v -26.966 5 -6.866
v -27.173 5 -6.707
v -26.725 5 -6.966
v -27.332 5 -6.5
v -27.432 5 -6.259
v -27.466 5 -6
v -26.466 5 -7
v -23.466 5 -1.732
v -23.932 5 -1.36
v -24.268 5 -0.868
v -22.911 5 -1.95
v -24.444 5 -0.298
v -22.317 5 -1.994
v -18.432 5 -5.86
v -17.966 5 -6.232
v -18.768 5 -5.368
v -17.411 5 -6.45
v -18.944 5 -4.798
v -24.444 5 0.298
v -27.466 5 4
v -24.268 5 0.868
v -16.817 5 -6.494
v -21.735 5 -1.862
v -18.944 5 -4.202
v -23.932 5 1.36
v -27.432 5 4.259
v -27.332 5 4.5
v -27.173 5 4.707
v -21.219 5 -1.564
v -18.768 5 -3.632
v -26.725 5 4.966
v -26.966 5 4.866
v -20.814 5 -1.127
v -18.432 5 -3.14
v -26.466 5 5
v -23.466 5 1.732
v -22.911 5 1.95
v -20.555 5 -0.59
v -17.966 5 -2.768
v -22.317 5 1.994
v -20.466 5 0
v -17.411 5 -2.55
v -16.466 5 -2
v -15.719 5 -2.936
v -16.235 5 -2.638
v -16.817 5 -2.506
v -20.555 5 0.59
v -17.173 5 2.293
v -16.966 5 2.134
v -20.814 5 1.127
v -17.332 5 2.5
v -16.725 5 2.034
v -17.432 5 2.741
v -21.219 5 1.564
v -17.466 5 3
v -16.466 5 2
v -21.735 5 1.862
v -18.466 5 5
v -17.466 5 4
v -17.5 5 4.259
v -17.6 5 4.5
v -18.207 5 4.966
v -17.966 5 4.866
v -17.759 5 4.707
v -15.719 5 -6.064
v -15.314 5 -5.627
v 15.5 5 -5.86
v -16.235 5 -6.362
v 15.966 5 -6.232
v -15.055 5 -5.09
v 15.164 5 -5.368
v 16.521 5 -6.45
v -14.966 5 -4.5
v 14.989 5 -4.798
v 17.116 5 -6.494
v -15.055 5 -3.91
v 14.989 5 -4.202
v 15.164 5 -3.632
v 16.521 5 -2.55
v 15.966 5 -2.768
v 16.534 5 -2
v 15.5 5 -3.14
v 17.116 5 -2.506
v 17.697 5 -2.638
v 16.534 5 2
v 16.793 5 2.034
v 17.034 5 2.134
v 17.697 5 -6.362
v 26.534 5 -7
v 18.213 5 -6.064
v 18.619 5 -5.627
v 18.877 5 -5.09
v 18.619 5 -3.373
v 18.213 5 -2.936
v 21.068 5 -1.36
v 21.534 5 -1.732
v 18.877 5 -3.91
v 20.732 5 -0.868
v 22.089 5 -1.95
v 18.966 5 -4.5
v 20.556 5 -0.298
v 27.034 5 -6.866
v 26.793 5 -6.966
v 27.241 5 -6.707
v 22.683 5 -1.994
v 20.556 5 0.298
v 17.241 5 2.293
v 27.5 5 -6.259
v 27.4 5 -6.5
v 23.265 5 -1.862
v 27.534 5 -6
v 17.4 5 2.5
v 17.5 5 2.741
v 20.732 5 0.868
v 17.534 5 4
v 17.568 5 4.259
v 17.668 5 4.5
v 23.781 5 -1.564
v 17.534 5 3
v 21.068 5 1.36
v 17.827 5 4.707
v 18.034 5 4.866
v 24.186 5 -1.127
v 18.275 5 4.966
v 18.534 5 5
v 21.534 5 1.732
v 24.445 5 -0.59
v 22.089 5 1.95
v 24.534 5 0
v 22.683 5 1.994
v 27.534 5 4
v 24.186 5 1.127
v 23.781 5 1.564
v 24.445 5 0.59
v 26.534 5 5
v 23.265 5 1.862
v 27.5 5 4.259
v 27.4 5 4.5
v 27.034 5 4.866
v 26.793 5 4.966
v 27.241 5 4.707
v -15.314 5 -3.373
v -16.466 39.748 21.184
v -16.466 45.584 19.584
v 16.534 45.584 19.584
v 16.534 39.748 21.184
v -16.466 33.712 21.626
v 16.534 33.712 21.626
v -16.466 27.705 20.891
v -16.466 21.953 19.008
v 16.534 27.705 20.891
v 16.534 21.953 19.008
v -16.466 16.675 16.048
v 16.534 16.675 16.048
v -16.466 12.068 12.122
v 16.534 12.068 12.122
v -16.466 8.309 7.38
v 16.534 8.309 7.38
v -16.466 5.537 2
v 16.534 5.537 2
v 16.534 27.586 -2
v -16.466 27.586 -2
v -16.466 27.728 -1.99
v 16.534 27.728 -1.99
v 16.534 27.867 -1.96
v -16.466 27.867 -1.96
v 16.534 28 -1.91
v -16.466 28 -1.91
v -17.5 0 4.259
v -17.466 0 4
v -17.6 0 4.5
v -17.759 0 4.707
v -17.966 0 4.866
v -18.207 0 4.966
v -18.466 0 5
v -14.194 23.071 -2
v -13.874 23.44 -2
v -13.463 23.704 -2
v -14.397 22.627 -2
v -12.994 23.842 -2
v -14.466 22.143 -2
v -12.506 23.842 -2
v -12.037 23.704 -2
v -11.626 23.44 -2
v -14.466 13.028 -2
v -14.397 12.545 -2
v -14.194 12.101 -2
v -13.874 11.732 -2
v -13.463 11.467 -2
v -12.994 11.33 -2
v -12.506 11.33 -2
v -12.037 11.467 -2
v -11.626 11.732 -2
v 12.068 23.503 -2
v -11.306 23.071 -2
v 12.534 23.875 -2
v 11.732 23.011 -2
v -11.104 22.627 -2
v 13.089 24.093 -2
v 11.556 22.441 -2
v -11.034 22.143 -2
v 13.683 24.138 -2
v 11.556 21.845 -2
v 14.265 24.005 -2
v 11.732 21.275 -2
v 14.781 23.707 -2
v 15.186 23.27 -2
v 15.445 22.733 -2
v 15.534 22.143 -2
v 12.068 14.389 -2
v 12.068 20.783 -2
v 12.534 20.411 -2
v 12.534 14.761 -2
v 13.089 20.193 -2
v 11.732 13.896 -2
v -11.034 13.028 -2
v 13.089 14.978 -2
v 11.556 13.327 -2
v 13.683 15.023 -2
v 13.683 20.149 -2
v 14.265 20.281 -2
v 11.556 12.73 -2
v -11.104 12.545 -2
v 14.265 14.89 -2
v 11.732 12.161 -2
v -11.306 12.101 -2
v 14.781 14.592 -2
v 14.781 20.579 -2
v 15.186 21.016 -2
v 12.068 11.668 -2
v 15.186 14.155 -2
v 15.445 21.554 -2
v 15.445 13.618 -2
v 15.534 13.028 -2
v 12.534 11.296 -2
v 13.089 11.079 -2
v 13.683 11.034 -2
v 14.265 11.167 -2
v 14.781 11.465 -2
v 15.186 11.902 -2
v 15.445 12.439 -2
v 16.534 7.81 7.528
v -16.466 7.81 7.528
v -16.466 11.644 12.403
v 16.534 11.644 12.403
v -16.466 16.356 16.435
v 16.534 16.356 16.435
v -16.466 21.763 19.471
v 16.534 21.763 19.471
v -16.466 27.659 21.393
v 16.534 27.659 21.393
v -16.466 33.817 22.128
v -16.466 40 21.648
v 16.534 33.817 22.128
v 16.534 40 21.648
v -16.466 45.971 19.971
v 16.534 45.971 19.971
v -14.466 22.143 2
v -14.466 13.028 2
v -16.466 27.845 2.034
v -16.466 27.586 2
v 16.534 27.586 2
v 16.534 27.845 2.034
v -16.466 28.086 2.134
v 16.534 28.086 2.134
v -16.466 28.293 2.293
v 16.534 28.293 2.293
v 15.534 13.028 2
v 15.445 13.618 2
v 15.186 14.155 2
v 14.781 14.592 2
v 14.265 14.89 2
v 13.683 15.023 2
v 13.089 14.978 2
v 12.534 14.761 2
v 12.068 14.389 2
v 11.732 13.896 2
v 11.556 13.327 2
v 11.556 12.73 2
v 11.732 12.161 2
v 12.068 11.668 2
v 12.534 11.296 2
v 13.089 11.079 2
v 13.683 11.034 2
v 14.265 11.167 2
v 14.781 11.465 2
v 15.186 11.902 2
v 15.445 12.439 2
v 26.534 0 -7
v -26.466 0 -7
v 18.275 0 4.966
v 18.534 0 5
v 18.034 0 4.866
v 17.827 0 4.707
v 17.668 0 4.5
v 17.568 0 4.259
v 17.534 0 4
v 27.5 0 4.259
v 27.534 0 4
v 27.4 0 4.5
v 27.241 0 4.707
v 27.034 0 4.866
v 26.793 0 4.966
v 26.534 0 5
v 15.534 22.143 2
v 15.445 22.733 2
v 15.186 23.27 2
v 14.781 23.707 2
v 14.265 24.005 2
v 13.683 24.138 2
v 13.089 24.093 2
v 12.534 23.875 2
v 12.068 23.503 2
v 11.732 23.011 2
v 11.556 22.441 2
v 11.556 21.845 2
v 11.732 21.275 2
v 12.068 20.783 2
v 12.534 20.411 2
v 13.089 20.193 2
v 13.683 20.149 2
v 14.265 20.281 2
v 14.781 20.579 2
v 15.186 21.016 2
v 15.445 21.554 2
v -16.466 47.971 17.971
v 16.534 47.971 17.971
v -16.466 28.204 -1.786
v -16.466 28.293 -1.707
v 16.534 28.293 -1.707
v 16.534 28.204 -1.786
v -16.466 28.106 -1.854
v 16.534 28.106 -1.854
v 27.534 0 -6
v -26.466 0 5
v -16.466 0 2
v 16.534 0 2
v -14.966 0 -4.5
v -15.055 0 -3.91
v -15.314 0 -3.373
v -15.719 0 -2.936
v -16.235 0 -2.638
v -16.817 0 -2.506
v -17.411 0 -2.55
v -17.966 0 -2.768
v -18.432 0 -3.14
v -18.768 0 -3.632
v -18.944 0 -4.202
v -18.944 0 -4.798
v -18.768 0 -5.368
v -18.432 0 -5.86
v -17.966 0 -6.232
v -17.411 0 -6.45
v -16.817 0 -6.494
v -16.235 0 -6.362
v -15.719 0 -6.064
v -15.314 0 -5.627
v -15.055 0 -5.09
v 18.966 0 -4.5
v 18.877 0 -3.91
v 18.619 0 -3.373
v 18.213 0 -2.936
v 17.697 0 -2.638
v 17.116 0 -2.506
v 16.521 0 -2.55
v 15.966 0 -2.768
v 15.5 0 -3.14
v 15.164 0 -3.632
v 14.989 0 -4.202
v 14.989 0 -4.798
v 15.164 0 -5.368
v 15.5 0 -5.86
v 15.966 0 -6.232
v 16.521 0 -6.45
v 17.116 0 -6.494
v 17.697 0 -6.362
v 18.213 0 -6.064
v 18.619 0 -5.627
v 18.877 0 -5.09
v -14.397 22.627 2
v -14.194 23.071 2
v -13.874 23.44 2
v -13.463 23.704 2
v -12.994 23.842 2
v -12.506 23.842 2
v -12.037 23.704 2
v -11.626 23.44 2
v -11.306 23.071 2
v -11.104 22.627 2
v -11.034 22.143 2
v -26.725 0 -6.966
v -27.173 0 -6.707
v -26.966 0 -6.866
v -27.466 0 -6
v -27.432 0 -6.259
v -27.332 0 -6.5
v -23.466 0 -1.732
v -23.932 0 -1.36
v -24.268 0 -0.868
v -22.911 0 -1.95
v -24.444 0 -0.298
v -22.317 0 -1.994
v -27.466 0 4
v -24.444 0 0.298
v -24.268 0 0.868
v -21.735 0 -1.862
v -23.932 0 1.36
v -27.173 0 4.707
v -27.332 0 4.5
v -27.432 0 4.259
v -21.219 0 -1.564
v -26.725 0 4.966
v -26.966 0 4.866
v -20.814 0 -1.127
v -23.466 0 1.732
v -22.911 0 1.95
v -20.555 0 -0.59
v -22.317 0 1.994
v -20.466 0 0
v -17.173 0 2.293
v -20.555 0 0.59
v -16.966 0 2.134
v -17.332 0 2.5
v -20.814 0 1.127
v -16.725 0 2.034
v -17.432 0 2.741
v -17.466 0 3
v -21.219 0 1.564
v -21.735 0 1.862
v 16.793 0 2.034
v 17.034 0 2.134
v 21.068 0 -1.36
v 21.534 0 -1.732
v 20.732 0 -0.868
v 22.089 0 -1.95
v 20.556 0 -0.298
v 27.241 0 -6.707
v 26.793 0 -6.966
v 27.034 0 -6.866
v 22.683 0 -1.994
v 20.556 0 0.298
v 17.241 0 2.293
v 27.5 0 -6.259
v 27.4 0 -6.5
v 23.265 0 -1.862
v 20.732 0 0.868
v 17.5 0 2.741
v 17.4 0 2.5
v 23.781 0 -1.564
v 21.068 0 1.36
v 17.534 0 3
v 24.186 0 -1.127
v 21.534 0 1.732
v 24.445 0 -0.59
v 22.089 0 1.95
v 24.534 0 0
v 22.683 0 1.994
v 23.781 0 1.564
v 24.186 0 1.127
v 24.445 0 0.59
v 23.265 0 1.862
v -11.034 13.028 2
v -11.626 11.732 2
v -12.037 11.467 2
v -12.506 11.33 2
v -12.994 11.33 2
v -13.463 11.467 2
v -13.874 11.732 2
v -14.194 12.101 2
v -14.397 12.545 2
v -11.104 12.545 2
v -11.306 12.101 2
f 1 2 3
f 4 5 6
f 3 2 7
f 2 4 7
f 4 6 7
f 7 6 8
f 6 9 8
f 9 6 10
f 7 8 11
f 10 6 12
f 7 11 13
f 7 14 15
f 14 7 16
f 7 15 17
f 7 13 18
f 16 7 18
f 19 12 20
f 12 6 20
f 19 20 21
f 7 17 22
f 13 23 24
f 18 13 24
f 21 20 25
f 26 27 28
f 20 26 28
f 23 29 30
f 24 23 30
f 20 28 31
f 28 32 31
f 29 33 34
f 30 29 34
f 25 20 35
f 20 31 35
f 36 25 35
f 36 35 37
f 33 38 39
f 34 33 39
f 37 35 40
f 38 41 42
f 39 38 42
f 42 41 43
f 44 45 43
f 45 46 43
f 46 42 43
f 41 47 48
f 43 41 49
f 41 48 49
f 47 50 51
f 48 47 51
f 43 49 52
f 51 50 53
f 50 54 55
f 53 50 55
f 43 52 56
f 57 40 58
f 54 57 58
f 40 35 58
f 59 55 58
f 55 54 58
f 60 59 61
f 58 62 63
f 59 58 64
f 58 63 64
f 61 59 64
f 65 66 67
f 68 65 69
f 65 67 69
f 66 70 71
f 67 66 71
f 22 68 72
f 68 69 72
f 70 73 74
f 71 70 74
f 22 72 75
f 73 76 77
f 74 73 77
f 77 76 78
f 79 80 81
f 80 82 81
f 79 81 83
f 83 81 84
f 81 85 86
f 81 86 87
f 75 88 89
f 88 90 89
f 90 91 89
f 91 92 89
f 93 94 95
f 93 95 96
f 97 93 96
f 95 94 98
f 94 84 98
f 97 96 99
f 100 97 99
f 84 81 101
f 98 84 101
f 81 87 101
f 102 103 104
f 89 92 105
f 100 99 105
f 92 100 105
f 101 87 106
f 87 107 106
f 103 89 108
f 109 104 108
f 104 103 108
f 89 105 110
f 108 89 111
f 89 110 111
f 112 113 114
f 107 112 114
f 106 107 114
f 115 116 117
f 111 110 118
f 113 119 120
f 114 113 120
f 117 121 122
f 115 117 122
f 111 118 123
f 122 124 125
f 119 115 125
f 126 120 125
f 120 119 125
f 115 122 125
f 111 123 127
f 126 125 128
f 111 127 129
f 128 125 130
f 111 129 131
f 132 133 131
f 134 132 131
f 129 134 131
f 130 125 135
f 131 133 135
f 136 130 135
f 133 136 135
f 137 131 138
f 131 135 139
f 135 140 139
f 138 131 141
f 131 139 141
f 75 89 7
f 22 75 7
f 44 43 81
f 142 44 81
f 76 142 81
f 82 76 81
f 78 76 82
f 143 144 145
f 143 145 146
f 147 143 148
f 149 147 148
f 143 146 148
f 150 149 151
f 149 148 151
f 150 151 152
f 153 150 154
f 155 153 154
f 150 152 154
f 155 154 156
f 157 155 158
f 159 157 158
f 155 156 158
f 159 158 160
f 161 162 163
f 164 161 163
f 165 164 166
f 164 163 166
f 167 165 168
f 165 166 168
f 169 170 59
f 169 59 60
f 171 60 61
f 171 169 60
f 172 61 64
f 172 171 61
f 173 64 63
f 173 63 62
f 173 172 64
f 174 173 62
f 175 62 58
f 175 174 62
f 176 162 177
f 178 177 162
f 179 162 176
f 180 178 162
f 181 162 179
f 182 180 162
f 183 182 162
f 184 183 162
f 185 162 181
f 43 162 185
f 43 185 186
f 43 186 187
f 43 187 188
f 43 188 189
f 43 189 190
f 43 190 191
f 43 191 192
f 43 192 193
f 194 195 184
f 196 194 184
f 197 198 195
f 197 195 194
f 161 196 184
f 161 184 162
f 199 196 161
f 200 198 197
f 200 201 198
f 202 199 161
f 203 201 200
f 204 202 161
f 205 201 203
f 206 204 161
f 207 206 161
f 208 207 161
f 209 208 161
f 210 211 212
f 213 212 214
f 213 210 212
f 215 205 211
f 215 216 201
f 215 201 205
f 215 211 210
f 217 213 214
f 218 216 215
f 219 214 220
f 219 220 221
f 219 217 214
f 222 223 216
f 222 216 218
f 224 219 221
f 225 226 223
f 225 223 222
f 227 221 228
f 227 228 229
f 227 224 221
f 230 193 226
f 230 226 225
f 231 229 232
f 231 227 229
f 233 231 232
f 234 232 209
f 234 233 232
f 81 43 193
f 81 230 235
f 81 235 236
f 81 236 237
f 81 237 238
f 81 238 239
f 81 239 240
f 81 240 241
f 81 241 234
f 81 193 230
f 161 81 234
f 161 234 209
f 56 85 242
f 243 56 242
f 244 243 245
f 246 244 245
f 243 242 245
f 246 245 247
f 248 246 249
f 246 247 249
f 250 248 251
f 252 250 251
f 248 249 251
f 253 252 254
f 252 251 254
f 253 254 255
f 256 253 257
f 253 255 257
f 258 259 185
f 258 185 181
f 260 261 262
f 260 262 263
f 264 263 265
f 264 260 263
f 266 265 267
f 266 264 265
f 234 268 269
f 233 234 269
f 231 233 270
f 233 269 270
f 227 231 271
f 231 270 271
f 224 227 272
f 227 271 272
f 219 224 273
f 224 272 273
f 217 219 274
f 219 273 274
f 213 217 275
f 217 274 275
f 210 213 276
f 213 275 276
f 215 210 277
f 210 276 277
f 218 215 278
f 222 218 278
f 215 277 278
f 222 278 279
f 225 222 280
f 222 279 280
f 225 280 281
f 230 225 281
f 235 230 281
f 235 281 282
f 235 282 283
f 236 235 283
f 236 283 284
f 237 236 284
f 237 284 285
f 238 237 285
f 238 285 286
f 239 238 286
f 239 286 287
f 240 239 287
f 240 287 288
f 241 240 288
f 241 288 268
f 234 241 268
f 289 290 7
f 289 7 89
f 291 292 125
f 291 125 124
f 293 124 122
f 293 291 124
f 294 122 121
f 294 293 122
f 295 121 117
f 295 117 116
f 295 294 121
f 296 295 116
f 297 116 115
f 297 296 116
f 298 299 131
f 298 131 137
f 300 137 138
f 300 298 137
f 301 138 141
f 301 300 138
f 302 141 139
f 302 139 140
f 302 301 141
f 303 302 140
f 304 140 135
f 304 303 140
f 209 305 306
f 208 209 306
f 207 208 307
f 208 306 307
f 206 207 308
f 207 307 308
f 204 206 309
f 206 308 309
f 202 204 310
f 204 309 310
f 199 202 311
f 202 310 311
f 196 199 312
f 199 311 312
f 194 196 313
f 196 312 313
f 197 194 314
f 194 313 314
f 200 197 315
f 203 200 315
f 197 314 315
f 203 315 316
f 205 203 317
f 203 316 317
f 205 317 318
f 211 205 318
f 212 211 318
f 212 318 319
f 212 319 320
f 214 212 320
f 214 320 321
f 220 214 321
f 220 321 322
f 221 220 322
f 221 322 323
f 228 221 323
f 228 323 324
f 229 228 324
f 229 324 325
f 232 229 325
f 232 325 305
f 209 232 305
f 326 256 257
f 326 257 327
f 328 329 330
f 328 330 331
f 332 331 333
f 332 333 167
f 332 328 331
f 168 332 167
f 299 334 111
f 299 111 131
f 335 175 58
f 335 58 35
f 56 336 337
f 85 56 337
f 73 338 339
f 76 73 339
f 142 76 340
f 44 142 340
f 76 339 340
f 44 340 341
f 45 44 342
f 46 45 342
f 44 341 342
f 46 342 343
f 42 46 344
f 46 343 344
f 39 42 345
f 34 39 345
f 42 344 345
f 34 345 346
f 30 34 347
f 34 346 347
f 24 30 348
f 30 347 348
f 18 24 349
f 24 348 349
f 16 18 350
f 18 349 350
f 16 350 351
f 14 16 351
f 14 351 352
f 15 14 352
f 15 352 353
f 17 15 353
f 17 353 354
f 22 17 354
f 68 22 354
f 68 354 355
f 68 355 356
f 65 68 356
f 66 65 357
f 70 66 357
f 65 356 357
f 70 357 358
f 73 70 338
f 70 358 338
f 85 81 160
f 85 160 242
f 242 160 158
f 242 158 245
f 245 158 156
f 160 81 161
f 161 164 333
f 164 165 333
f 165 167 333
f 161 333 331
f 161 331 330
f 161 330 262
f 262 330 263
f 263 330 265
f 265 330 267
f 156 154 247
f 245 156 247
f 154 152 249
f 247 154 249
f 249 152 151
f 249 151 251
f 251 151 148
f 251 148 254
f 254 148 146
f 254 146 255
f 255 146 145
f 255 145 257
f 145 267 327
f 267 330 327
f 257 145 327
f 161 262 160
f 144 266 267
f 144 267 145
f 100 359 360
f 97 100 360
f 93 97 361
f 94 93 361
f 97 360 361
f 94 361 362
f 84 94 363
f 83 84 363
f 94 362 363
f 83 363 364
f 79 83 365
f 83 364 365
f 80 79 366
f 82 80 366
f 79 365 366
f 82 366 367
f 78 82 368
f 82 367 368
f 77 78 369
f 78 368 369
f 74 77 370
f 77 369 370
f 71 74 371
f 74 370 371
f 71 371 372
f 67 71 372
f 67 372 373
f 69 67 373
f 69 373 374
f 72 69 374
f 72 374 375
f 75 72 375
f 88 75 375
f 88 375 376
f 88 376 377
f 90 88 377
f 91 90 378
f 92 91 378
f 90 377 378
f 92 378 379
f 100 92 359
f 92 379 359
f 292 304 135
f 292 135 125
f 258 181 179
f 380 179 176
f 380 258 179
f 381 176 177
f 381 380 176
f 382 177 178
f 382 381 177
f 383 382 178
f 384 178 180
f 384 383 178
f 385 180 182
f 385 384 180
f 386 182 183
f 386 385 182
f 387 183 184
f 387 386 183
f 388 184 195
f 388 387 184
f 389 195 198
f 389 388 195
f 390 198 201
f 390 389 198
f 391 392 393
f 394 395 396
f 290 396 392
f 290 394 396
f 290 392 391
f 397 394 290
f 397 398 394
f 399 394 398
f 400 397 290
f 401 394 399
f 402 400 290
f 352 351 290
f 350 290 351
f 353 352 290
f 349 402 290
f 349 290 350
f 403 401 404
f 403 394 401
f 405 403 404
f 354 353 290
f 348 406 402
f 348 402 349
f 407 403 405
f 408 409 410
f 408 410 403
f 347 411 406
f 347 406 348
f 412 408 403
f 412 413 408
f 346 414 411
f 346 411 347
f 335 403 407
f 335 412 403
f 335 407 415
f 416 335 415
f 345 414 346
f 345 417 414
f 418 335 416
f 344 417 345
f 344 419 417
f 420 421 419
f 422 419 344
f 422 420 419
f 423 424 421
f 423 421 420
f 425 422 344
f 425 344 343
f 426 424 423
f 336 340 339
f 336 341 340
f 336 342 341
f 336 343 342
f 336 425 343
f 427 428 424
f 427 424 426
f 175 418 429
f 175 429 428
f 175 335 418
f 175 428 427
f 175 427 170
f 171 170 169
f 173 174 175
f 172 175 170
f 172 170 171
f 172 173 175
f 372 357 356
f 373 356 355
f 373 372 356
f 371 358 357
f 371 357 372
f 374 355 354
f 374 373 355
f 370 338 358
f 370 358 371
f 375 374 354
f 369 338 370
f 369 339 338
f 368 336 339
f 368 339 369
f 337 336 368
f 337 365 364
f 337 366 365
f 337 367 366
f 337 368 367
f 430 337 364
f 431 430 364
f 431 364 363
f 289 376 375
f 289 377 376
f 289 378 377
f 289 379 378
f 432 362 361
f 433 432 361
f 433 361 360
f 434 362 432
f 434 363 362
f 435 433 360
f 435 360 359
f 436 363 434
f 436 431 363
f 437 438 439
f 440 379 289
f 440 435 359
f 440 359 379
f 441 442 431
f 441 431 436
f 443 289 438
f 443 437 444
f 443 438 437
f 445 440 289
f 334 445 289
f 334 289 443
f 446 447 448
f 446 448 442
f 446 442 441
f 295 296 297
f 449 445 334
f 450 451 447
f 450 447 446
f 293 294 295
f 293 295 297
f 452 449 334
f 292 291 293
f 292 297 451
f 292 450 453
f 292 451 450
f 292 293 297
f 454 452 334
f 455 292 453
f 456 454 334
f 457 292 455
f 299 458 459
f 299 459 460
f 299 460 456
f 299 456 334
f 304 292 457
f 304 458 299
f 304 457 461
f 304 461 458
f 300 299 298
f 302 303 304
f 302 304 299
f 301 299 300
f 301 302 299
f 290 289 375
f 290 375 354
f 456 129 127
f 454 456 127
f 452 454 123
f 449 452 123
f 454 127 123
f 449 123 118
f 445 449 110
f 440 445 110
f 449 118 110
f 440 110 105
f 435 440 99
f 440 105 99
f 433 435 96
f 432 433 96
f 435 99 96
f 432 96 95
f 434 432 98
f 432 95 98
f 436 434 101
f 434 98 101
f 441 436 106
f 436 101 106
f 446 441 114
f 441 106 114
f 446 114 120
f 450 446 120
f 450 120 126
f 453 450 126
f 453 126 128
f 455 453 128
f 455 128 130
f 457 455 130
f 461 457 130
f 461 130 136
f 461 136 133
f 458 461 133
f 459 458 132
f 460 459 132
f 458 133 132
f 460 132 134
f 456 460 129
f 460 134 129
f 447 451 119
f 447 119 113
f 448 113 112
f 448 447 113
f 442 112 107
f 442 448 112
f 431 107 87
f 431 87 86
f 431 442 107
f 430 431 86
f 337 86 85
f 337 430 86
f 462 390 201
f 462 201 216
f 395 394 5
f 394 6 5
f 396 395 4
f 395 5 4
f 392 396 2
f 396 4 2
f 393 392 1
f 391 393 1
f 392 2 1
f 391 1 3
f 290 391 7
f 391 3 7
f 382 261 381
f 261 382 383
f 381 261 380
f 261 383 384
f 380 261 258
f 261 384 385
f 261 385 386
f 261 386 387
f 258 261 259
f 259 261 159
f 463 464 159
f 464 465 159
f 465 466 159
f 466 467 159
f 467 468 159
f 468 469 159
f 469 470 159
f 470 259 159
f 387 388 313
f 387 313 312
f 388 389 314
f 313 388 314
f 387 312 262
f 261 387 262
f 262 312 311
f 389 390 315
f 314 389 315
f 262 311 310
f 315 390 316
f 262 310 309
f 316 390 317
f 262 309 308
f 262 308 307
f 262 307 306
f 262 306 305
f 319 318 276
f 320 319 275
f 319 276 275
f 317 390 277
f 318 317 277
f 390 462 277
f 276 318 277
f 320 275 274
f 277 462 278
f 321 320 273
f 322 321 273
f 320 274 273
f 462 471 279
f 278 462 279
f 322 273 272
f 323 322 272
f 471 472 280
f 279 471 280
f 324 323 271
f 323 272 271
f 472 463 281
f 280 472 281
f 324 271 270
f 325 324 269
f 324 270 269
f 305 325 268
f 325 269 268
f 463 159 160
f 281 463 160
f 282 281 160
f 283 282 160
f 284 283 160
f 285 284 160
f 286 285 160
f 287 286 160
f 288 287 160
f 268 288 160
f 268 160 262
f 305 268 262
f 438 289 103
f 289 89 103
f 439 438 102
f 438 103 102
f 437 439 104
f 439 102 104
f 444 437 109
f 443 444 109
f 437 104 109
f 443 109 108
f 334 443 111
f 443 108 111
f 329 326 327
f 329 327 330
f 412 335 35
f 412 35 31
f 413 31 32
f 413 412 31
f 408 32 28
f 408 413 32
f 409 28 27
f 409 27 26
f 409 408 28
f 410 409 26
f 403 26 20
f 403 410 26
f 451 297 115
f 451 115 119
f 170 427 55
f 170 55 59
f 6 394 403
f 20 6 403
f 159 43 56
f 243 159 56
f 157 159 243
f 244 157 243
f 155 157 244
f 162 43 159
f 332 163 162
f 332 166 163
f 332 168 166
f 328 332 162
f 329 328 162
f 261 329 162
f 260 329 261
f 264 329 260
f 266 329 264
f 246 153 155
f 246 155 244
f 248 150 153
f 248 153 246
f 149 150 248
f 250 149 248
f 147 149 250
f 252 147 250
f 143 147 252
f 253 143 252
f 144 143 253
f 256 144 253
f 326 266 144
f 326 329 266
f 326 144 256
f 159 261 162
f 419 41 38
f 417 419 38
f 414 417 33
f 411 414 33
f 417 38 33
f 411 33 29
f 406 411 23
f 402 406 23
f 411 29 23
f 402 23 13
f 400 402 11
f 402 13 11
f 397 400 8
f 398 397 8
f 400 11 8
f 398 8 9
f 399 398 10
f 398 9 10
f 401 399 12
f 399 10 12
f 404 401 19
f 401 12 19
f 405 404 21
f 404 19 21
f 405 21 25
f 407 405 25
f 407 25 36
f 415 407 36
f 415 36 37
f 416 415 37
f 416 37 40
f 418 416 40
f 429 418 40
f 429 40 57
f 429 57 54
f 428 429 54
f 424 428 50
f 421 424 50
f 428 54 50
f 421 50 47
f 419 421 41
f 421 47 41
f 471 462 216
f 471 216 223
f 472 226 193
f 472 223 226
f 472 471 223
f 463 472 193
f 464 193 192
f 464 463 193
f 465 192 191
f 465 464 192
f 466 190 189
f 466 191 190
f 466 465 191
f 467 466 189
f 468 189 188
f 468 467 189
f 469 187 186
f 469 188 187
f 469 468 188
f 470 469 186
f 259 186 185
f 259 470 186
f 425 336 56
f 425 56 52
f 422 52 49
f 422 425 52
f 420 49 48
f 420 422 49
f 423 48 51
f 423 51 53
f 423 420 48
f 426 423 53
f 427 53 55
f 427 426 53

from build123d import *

# Parameters (mm, degrees)
EXTRUDE_2_DEPTH     = 5
SKETCH_4_W          = 33
SKETCH_4_H          = 4
EXTRUDE_3_DEPTH     = 23
EXTRUDE_4_DEPTH     = 33
SKETCH_11_R         = 2
CUT_EXTRUDE_1_DEPTH = 14
CUT_EXTRUDE_2_DEPTH = 33
SKETCH_17_R         = 2
CUT_EXTRUDE_3_DEPTH = 5
SKETCH_18_W         = 37
SKETCH_18_H         = 3
EXTRUDE_5_DEPTH     = 5
SKETCH_19_W         = 55
SKETCH_19_H         = 4.170749575
EXTRUDE_6_DEPTH     = 5
SKETCH_21_R         = 2
CUT_EXTRUDE_4_DEPTH = 5
FILLET_1_R          = 1
EXTRUDE_10_DEPTH    = 33


with BuildPart() as part:
    # 草图1 → 凸台-拉伸2 (new body)
    with BuildSketch(Plane(origin=(0, 0, 0), x_dir=(1, 0, 0), z_dir=(0, 1, 0))):
        with BuildLine():
            Line((26.533821687, -5), (18.533821687, -5))
            ThreePointArc((18.533821687, -5), (17.826714906, -4.707106781), (17.533821687, -4))
            Line((17.533821687, -4), (17.533821687, -3))
            ThreePointArc((17.533821687, -3), (17.240928468, -2.292893219), (16.533821687, -2))
            Line((16.533821687, -2), (-16.466178313, -2))
            ThreePointArc((-16.466178313, -2), (-17.173285094, -2.292893219), (-17.466178313, -3))
            Line((-17.466178313, -3), (-17.466178313, -4))
            ThreePointArc((-17.466178313, -4), (-17.759071532, -4.707106781), (-18.466178313, -5))
            Line((-18.466178313, -5), (-26.466178313, -5))
            ThreePointArc((-26.466178313, -5), (-27.173285094, -4.707106781), (-27.466178313, -4))
            Line((-27.466178313, -4), (-27.466178313, 4))
            ThreePointArc((-27.466178313, 4), (-27.173285094, 4.707106781), (-26.466178313, 5))
            Line((-26.466178313, 5), (-18.466178313, 5))
            ThreePointArc((-18.466178313, 5), (-17.759071532, 4.707106781), (-17.466178313, 4))
            Line((-17.466178313, 4), (-17.466178313, 3))
            ThreePointArc((-17.466178313, 3), (-17.173285094, 2.292893219), (-16.466178313, 2))
            Line((-16.466178313, 2), (16.533821687, 2))
            ThreePointArc((16.533821687, 2), (17.240928468, 2.292893219), (17.533821687, 3))
            Line((17.533821687, 3), (17.533821687, 4))
            ThreePointArc((17.533821687, 4), (17.826714906, 4.707106781), (18.533821687, 5))
            Line((18.533821687, 5), (26.533821687, 5))
            ThreePointArc((26.533821687, 5), (27.240928468, 4.707106781), (27.533821687, 4))
            Line((27.533821687, 4), (27.533821687, -4))
            ThreePointArc((27.533821687, -4), (27.240928468, -4.707106781), (26.533821687, -5))
        make_face()
    extrude(amount=EXTRUDE_2_DEPTH)

    # 草图4 → 凸台-拉伸3 (add)
    with BuildSketch(Plane(origin=(0, 5, 0), x_dir=(1, 0, 0), z_dir=(0, 1, 0))):
        with Locations((0.033821687, 0)):
            Rectangle(SKETCH_4_W, SKETCH_4_H)
    extrude(amount=EXTRUDE_3_DEPTH)

    # 草图5 → 凸台-拉伸4 (add)
    with BuildSketch(Plane.ZY.offset(16.466178313)):
        with BuildLine():
            ThreePointArc((2, 27.585786438), (2.076120467, 27.96846987), (2.292893219, 28.292893219))
            Line((2.292893219, 28.292893219), (19.970562748, 45.970562748))
            Line((19.970562748, 45.970562748), (17.970562748, 47.970562748))
            Line((17.970562748, 47.970562748), (-1.707106781, 28.292893219))
            ThreePointArc((-1.707106781, 28.292893219), (-1.821797126, 28.155566643), (-1.910179721, 28))
            Line((-1.910179721, 28), (2, 28))
            Line((2, 28), (2, 27.585786438))
        make_face()
    extrude(amount=-EXTRUDE_4_DEPTH)

    # 草图11 → 切除-拉伸1 (cut)
    with BuildSketch(Plane.XY.offset(2)):
        with Locations((13.533821687, 22.143107046)):
            Circle(SKETCH_11_R)
        with Locations((13.533821687, 13.028465829)):
            Circle(SKETCH_11_R)
        with BuildLine():
            Line((-11.034001398, 22.143107046), (-11.034001398, 13.028465829))
            ThreePointArc((-11.034001398, 13.028465829), (-12.750089855, 11.312377371), (-14.466178313, 13.028465829))
            Line((-14.466178313, 13.028465829), (-14.466178313, 22.143107046))
            ThreePointArc((-14.466178313, 22.143107046), (-12.750089855, 23.859195504), (-11.034001398, 22.143107046))
        make_face()
    extrude(amount=-CUT_EXTRUDE_1_DEPTH, mode=Mode.SUBTRACT)

    # 草图16 → 切除-拉伸2 (cut)
    with BuildSketch(Plane.ZY.offset(16.466178313)):
        with BuildLine():
            Line((-1.910179721, 28), (-2, 28))
            Line((-2, 28), (-2, 27.585786438))
            ThreePointArc((-2, 27.585786438), (-1.97728699, 27.797706563), (-1.910179721, 28))
        make_face()
    extrude(amount=-CUT_EXTRUDE_2_DEPTH, mode=Mode.SUBTRACT)

    # 草图17 → 切除-拉伸3 (cut)
    with BuildSketch(Plane(origin=(0, 5, 0), x_dir=(1, 0, 0), z_dir=(0, 1, 0))):
        with Locations((22.533821687, 0)):
            Circle(SKETCH_17_R)
        with Locations((-22.466178313, 0)):
            Circle(SKETCH_17_R)
    extrude(amount=-CUT_EXTRUDE_3_DEPTH, mode=Mode.SUBTRACT)

    # 草图18 → 凸台-拉伸5 (add)
    with BuildSketch(Plane.XZ):
        with Locations((0.033821687, -3.5)):
            Rectangle(SKETCH_18_W, SKETCH_18_H)
    extrude(amount=-EXTRUDE_5_DEPTH)

    # 草图19 → 凸台-拉伸6 (add)
    with BuildSketch(Plane.XZ):
        with Locations((0.033821687, -4.914625212)):
            Rectangle(SKETCH_19_W, SKETCH_19_H)
    extrude(amount=-EXTRUDE_6_DEPTH)

    # 草图21 → 切除-拉伸4 (cut)
    with BuildSketch(Plane.XZ):
        with Locations((-16.966178313, -4.5)):
            Circle(SKETCH_21_R)
        with Locations((16.966178313, -4.5)):
            Circle(SKETCH_21_R)
    extrude(amount=-CUT_EXTRUDE_4_DEPTH, mode=Mode.SUBTRACT)

    # 圆角1
    fillet_1_edges = [part.edges().sort_by_distance(p)[0] for p in [
        (27.533821687, 2.5, -7),
        (-27.466178313, 2.5, -7),
    ]]
    fillet(fillet_1_edges, radius=FILLET_1_R)

    # 草图29 → 凸台-拉伸10 (add)
    with BuildSketch(Plane(origin=(16.533821687, 0, 0), x_dir=(0, 0, -1), z_dir=(1, 0, 0))):
        with BuildLine():
            Line((-2, 5.537377417), (-2, 5))
            ThreePointArc((-2, 5), (-19.470562748, 21.763455967), (-19.970562748, 45.970562748))
            Line((-19.970562748, 45.970562748), (-19.583896385, 45.583896385))
            ThreePointArc((-19.583896385, 45.583896385), (-19.007789844, 21.953169584), (-2, 5.537377417))
        make_face()
    extrude(amount=-EXTRUDE_10_DEPTH)


solid = part.part
